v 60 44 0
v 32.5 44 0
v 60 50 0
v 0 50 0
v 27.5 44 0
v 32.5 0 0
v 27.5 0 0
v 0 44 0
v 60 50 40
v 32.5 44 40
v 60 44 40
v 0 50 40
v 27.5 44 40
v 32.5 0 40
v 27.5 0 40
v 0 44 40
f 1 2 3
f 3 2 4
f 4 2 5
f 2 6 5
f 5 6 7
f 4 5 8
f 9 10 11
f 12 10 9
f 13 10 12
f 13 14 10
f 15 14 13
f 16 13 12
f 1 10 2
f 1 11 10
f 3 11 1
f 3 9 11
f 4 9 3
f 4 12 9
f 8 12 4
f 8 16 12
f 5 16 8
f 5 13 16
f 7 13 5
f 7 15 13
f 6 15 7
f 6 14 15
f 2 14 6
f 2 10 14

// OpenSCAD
$fn = 32;

// ----------------------------------------------------------------------
// Structural section: tee 60 x 50 mm
// ----------------------------------------------------------------------

// --- parameters (mm) ---
sec_w = 60;               // tee width, X
sec_h = 50;               // tee height, Y
flange_t = 6;             // top flange thickness
web_t = 5;                // web thickness
plate_t = 40;             // cut length, Z (extrusion height)

profile = [[27.5, 0], [32.5, 0], [32.5, 44], [60, 44], [60, 50], [0, 50], [0, 44], [27.5, 44]];  // primary outline, 8 points, counter clockwise

// --- the one profile operation ---
linear_extrude(height = plate_t) polygon(points = profile);
